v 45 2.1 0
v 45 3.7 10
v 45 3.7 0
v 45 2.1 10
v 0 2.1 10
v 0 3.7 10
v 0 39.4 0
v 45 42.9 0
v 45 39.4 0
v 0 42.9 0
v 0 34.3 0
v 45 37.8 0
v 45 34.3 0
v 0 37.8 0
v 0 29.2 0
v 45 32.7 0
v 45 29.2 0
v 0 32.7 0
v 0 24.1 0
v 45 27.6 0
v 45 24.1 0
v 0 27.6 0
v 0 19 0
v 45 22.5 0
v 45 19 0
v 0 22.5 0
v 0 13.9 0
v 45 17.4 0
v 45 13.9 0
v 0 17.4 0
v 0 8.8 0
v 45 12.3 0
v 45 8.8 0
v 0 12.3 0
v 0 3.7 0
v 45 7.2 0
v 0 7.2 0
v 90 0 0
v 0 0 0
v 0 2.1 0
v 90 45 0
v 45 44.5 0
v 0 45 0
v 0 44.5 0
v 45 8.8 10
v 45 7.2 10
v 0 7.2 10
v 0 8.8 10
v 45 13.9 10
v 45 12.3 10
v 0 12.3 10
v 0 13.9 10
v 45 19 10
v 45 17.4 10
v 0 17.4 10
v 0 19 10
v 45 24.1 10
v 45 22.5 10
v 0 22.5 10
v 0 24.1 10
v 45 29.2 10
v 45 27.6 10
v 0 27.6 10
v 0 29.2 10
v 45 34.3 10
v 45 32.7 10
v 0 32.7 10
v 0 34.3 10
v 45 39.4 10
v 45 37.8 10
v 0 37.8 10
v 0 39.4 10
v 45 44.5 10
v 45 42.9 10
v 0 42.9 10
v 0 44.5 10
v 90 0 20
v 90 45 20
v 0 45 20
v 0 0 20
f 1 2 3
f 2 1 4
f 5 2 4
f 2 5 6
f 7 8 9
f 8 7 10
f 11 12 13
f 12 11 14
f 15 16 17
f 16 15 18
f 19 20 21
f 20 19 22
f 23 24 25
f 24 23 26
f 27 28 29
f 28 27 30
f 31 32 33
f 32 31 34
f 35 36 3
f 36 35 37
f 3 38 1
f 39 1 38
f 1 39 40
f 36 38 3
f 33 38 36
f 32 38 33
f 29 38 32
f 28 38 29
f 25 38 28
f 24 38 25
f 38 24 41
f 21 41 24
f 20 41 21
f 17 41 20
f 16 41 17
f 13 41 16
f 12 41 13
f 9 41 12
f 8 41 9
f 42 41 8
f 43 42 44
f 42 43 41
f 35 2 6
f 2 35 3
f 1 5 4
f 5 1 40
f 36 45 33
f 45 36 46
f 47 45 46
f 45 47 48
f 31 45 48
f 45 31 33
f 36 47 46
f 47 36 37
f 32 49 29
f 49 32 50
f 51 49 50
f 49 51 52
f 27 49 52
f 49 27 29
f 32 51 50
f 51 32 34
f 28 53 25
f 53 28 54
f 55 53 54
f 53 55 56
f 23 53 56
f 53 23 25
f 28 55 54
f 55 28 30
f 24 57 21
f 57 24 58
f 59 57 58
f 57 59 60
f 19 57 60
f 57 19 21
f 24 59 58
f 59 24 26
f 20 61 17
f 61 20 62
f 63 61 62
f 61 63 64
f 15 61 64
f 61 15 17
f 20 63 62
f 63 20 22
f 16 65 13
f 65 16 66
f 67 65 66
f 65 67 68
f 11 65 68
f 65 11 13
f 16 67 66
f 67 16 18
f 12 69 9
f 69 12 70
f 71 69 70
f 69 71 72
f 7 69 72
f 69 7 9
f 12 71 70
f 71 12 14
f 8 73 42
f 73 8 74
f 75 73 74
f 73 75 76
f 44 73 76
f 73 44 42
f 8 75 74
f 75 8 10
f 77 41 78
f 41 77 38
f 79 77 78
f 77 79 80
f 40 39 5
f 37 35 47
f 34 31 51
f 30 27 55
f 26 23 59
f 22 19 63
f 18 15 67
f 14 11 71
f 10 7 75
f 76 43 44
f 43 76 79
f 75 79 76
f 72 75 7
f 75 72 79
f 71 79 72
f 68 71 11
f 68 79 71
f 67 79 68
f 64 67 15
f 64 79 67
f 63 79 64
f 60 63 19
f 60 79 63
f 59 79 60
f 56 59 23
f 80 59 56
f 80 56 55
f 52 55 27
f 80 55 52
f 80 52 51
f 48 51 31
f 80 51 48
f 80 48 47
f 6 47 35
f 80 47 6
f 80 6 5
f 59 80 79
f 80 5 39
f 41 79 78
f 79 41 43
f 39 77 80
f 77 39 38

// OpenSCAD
// Slide drying rack - a solid base block with a row of parallel slots standing up on their long
// edge, for drying 10 x 75 mm microscope slides. NOVEL general part.
//

slides = 10;
base_l = 90;
base_w = 45;
base_h = 20;
slot_l = 77;
slot_w = 1.6;
slot_d = 10;
pitch   = 3.5;

$fn = 48;

slot_x = (base_l - 2 * slot_l) / 2;
pitch_y = slot_w + pitch;
start_y = (base_w - slides * pitch_y) / 2;

difference() {
    translate([0, 0, 0]) cube([base_l, base_w, base_h]);
    for (i = [0 : slides - 1])
        translate([slot_x, start_y + i * pitch_y, 0]) cube([slot_l, slot_w, base_h - slot_d]);
}
